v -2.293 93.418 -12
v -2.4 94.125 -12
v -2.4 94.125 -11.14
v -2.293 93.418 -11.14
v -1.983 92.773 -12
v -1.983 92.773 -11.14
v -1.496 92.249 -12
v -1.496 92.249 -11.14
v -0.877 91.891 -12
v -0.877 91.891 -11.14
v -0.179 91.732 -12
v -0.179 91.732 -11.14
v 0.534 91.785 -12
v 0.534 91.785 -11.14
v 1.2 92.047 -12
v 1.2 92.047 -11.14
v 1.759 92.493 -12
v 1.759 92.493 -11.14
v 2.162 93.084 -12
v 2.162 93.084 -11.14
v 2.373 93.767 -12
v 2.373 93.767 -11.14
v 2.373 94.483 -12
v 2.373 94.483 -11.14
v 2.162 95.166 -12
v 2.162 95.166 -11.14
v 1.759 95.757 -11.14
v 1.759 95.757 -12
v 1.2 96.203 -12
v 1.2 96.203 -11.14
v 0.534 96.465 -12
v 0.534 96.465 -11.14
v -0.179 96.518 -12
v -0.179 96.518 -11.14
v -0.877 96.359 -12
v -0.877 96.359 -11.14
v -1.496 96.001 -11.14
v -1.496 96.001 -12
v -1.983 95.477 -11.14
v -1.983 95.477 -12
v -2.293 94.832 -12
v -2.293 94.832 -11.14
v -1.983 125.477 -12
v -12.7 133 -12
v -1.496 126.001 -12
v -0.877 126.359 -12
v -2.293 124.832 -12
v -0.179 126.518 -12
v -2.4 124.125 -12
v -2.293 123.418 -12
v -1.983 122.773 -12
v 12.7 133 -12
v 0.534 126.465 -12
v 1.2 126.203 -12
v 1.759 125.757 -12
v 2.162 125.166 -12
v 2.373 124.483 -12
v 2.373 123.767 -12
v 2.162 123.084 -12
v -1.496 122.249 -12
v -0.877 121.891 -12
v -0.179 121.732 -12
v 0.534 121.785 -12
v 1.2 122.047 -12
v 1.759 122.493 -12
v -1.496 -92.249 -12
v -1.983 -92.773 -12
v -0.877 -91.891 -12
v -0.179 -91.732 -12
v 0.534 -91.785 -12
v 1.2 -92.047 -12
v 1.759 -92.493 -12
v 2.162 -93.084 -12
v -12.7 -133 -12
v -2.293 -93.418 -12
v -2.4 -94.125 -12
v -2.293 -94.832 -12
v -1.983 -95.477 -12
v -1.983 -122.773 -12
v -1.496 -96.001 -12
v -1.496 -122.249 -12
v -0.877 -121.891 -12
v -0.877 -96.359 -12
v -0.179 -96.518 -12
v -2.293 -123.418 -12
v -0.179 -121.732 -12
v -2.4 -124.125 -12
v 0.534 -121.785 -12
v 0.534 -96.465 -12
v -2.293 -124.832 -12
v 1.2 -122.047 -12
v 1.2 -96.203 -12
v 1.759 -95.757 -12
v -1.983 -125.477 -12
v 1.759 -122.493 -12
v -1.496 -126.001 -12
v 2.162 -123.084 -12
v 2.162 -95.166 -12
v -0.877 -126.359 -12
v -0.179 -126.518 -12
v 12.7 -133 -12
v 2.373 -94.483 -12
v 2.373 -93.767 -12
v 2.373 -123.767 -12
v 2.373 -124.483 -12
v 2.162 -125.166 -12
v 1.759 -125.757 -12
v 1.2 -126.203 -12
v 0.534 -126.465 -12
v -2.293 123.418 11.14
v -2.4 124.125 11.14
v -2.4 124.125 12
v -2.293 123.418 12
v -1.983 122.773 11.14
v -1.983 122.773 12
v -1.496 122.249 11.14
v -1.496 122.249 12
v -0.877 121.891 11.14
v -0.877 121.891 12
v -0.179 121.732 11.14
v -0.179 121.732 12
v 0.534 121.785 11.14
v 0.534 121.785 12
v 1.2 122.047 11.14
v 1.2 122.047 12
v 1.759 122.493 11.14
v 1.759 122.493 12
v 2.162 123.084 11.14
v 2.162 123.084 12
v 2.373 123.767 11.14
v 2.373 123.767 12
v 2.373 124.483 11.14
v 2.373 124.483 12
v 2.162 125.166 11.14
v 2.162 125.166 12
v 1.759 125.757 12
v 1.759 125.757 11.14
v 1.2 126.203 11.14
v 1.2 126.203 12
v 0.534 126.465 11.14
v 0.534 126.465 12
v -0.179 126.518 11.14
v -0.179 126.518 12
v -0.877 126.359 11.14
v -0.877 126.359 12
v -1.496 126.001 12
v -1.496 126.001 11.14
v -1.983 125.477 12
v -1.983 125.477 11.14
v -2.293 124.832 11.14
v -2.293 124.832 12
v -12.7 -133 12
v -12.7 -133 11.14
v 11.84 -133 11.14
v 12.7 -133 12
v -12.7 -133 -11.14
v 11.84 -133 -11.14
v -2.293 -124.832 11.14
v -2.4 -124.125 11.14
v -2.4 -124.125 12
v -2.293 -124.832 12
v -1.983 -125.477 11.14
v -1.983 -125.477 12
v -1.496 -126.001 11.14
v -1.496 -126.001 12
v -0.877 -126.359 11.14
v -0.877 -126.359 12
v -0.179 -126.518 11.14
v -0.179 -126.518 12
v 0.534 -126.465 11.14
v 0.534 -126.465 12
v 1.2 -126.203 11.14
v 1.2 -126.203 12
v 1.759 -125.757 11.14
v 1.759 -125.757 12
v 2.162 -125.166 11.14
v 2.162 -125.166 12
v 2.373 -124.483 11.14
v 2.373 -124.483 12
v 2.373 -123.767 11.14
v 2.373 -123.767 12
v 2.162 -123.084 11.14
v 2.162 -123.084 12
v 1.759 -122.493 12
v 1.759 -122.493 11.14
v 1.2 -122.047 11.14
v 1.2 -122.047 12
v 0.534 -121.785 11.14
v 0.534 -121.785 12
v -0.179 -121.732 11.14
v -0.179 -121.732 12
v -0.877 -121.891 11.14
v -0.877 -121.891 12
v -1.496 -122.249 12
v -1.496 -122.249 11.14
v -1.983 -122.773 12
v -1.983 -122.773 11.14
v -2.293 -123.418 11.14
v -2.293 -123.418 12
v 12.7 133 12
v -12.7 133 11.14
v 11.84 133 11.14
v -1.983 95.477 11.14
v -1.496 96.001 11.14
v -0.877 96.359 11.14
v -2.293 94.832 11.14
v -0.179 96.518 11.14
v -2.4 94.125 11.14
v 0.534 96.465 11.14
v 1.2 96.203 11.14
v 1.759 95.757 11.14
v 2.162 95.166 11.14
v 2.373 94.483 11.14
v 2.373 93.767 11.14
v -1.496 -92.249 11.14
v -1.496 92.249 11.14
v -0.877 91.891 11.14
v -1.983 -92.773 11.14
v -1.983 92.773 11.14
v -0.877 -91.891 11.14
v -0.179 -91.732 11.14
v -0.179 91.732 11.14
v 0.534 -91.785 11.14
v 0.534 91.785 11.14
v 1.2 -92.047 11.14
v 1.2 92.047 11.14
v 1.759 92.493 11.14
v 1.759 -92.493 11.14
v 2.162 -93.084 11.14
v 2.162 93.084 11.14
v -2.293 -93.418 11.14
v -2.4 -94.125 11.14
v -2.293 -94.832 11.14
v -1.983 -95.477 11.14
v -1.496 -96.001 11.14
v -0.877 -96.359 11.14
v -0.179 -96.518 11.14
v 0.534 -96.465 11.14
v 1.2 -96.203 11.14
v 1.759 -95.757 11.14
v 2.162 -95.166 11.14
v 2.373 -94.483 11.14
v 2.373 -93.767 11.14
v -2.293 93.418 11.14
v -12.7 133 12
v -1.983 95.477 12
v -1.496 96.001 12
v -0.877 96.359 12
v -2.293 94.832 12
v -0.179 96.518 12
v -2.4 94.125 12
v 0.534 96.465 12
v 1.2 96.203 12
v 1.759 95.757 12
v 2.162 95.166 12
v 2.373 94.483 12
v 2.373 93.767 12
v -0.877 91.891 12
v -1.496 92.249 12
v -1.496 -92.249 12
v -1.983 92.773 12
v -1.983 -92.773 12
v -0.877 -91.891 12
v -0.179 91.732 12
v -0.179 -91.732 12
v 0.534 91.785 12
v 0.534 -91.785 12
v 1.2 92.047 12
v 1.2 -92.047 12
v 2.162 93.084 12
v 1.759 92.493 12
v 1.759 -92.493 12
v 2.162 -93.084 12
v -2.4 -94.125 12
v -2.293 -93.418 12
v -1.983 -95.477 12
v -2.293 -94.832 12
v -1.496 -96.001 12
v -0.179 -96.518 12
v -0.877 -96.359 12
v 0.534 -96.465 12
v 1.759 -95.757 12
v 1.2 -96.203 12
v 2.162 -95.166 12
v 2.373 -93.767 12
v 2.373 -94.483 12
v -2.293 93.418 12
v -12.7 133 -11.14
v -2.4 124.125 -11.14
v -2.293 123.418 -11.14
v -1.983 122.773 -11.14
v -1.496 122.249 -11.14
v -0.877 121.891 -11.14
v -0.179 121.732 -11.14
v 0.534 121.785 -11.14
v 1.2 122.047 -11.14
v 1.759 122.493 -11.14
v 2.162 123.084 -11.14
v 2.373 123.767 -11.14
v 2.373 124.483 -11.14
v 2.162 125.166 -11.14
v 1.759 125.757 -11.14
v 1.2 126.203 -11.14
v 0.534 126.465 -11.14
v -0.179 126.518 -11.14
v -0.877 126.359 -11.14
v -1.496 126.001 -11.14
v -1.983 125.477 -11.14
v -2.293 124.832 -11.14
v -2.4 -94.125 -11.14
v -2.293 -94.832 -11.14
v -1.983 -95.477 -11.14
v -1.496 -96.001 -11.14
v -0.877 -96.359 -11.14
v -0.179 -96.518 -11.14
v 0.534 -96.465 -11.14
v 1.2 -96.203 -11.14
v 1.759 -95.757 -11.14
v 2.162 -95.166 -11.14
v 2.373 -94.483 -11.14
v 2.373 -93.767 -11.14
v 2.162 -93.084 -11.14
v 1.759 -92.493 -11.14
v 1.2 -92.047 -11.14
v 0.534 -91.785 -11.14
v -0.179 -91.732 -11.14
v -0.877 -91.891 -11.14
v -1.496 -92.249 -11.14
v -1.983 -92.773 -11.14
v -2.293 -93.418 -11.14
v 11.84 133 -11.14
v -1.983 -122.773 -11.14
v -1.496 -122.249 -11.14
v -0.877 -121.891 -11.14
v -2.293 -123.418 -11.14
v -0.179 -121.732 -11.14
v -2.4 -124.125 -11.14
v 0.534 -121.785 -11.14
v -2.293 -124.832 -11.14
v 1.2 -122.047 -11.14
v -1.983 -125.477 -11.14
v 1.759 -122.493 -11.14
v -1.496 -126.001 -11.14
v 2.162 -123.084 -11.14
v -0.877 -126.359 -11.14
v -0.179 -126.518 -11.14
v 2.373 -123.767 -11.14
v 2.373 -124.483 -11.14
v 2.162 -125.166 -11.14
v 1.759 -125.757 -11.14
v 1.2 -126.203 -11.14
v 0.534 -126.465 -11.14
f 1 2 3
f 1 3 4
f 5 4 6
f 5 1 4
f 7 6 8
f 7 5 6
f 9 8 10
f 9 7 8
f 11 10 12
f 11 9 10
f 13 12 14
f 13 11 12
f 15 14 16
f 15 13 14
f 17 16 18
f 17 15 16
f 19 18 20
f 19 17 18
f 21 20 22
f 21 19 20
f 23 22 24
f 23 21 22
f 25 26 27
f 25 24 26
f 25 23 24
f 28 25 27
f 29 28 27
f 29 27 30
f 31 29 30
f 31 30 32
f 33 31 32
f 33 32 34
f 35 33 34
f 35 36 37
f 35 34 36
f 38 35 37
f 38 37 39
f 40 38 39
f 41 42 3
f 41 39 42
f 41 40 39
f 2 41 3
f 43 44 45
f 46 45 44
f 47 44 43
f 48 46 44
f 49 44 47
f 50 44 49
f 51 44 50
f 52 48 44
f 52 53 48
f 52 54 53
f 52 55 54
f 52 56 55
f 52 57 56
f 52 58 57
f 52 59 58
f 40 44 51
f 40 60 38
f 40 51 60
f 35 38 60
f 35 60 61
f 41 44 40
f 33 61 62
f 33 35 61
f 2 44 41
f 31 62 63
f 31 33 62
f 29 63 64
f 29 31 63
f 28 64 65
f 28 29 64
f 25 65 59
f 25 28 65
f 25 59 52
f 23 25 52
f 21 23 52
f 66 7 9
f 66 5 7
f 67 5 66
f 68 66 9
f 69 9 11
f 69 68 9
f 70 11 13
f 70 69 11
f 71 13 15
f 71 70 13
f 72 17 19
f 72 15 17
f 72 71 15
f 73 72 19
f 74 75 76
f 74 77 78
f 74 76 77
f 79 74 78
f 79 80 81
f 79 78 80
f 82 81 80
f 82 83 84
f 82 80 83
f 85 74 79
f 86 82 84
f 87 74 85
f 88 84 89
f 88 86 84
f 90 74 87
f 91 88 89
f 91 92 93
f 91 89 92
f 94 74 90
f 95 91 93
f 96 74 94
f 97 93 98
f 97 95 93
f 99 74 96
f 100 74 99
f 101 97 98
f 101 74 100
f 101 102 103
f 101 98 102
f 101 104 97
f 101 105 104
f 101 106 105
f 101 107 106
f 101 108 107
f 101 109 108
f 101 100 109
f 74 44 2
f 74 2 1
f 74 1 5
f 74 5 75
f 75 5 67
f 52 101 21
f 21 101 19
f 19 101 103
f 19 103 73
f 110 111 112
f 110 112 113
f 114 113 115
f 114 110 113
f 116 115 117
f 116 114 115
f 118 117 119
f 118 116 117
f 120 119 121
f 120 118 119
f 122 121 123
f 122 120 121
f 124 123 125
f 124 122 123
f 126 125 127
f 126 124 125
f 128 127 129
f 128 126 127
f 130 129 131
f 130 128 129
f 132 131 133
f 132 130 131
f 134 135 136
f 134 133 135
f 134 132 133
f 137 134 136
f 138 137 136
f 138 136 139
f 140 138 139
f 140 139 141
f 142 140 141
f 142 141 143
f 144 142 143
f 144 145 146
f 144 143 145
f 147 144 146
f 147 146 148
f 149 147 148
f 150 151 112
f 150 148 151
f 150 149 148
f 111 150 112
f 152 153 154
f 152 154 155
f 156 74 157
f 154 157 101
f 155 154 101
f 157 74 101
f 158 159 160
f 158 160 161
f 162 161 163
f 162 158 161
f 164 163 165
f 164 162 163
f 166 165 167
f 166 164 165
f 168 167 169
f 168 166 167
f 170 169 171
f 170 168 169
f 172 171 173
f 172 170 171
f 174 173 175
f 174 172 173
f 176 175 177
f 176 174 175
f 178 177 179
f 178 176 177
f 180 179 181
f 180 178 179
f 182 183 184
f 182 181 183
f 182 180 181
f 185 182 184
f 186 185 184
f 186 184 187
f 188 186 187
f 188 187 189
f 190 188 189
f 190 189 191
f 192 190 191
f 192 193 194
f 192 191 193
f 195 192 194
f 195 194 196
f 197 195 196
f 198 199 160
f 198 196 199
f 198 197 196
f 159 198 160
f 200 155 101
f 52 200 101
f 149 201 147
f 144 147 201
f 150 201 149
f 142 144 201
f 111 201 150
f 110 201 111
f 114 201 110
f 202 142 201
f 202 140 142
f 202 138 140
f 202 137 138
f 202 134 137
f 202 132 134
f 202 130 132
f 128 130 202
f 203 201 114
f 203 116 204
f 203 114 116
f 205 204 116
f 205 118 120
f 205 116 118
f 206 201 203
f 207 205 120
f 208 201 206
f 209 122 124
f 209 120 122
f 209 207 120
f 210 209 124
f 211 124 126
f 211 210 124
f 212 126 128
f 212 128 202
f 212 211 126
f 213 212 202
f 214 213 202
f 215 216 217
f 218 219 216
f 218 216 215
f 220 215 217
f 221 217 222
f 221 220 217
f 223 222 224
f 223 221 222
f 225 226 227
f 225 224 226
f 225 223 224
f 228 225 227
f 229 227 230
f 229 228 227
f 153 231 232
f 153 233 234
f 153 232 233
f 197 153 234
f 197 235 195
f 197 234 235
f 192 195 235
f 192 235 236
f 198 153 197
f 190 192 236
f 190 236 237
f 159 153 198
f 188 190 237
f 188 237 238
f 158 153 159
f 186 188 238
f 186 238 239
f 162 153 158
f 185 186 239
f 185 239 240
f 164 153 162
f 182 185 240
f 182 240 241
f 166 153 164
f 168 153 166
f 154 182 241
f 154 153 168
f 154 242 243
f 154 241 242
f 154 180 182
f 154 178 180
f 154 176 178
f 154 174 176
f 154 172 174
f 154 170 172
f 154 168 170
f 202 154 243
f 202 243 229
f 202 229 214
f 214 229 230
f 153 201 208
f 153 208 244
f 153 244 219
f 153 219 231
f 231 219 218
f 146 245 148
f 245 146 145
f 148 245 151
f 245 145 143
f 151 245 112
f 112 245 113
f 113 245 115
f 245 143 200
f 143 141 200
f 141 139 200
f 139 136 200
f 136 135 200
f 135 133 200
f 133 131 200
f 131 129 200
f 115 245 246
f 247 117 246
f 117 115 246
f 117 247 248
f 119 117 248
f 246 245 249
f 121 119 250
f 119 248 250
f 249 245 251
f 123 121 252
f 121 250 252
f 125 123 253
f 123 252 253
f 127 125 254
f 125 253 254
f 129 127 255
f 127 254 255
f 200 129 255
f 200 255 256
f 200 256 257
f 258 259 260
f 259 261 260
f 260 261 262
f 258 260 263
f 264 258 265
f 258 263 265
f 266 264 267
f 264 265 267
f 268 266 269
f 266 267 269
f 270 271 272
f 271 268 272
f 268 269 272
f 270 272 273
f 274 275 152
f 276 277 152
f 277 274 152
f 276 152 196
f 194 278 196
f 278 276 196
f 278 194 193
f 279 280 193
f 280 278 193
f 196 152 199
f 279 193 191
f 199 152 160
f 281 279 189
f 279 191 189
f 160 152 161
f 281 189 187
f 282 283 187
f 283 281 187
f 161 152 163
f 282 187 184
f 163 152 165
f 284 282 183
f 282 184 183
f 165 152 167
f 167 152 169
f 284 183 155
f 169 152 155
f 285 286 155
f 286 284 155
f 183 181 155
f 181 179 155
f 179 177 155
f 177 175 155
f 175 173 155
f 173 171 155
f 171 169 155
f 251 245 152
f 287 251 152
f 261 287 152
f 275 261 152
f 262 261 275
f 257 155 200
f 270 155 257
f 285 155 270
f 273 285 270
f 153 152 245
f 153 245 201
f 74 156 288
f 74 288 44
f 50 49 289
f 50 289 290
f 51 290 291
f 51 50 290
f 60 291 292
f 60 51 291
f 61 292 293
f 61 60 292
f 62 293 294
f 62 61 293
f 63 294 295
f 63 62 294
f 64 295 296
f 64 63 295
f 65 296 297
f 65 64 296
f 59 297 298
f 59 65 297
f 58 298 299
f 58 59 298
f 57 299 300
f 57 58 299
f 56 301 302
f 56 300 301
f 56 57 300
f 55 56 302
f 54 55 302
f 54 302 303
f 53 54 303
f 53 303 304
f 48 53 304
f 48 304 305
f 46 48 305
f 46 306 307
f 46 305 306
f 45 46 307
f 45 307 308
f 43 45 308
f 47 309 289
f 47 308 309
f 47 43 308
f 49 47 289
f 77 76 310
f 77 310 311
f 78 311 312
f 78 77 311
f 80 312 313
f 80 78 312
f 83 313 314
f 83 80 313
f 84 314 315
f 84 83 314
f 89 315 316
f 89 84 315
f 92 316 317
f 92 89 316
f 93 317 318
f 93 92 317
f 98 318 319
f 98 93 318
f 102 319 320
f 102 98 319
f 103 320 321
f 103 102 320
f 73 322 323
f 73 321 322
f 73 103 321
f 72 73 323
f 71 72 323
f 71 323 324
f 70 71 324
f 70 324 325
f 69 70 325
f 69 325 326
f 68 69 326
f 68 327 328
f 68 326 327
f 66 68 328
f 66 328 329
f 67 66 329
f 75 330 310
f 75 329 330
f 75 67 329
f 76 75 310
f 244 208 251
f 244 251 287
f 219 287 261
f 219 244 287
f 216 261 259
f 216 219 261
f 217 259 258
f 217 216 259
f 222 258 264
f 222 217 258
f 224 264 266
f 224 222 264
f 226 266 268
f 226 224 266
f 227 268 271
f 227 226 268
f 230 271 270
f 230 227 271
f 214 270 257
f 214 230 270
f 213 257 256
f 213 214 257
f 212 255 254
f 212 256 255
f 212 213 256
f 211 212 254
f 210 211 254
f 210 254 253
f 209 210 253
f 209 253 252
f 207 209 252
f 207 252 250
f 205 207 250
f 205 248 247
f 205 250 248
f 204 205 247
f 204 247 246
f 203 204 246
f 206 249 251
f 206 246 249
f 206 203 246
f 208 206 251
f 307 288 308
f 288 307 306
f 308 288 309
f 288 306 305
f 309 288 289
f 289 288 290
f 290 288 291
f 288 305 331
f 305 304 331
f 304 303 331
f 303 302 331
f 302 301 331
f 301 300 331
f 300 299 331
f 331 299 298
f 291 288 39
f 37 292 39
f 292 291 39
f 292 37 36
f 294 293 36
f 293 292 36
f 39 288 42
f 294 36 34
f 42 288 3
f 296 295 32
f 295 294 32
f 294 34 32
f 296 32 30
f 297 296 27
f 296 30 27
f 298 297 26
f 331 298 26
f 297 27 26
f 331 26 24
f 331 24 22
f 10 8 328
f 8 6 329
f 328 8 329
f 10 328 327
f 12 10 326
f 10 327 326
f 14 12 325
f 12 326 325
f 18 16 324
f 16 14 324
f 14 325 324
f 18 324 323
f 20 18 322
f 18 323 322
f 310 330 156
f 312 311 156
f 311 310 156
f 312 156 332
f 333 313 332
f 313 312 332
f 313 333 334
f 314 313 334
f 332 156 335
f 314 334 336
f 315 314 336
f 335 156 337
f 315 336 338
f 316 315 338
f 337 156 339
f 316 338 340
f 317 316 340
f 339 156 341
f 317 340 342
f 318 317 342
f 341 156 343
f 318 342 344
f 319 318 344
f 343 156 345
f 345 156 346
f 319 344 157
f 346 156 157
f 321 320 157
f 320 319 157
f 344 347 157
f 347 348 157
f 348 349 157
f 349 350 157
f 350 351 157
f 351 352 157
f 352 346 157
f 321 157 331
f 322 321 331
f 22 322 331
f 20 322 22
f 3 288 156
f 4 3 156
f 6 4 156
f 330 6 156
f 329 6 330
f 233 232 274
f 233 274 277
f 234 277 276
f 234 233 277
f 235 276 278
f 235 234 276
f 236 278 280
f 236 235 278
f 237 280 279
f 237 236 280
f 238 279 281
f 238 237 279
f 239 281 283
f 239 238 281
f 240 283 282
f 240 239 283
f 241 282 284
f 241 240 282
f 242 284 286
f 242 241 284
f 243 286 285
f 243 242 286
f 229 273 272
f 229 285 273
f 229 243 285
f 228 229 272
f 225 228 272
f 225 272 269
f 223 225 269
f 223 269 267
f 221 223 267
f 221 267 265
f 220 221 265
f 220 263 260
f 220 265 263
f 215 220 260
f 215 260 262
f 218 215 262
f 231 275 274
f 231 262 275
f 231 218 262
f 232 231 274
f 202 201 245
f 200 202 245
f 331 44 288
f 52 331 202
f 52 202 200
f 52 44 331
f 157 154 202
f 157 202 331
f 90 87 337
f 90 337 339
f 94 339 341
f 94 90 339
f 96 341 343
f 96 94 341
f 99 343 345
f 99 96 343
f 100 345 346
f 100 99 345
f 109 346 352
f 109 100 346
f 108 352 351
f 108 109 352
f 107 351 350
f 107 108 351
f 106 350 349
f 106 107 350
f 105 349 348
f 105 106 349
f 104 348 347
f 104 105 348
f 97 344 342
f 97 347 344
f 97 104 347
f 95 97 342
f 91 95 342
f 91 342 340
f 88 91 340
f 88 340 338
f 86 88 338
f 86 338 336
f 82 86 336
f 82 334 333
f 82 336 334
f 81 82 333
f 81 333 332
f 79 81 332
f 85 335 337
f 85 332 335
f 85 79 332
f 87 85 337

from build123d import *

# Parameters (mm, degrees)
BOSS_EXTRUDE1_DEPTH      = 133
BOSS_EXTRUDE1_DEPTH_BACK = 133
SKETCH1_W                = 25.4
SKETCH1_H                = 24
CUT_EXTRUDE1_DEPTH       = 150
CUT_EXTRUDE1_DEPTH_BACK  = 150
SKETCH2_W                = 26
SKETCH2_H                = 22.28
CUT_EXTRUDE2_DEPTH       = 150
CUT_EXTRUDE2_DEPTH_BACK  = 150
SKETCH3_R                = 2.4


with BuildPart() as part:
    # Sketch1 → Boss-Extrude1 (new, two sides: drawn at the far end of the back side and taken through both)
    with BuildSketch(Plane(origin=(0, 0, 0), x_dir=(1, 0, 0), z_dir=(0, 1, 0)).offset(-BOSS_EXTRUDE1_DEPTH_BACK)):
        Rectangle(SKETCH1_W, SKETCH1_H)
    extrude(amount=BOSS_EXTRUDE1_DEPTH + BOSS_EXTRUDE1_DEPTH_BACK)

    # Sketch2 → Cut-Extrude1 (cut, two sides: drawn at the far end of the back side and taken through both)
    with BuildSketch(Plane(origin=(0, 0, 0), x_dir=(1, 0, 0), z_dir=(0, 1, 0)).offset(-CUT_EXTRUDE1_DEPTH_BACK)):
        with Locations((-1.16, 0)):
            Rectangle(SKETCH2_W, SKETCH2_H)
    extrude(amount=CUT_EXTRUDE1_DEPTH + CUT_EXTRUDE1_DEPTH_BACK, mode=Mode.SUBTRACT)

    # Sketch3 → Cut-Extrude2 (cut, two sides: drawn at the far end of the back side and taken through both)
    with BuildSketch(Plane.XY.offset(-CUT_EXTRUDE2_DEPTH_BACK)):
        with Locations((0, 124.125)):
            Circle(SKETCH3_R)
        with Locations((0, 94.125)):
            Circle(SKETCH3_R)
        with Locations((0, -124.125)):
            Circle(SKETCH3_R)
        with Locations((0, -94.125)):
            Circle(SKETCH3_R)
    extrude(amount=CUT_EXTRUDE2_DEPTH + CUT_EXTRUDE2_DEPTH_BACK, mode=Mode.SUBTRACT)


solid = part.part
